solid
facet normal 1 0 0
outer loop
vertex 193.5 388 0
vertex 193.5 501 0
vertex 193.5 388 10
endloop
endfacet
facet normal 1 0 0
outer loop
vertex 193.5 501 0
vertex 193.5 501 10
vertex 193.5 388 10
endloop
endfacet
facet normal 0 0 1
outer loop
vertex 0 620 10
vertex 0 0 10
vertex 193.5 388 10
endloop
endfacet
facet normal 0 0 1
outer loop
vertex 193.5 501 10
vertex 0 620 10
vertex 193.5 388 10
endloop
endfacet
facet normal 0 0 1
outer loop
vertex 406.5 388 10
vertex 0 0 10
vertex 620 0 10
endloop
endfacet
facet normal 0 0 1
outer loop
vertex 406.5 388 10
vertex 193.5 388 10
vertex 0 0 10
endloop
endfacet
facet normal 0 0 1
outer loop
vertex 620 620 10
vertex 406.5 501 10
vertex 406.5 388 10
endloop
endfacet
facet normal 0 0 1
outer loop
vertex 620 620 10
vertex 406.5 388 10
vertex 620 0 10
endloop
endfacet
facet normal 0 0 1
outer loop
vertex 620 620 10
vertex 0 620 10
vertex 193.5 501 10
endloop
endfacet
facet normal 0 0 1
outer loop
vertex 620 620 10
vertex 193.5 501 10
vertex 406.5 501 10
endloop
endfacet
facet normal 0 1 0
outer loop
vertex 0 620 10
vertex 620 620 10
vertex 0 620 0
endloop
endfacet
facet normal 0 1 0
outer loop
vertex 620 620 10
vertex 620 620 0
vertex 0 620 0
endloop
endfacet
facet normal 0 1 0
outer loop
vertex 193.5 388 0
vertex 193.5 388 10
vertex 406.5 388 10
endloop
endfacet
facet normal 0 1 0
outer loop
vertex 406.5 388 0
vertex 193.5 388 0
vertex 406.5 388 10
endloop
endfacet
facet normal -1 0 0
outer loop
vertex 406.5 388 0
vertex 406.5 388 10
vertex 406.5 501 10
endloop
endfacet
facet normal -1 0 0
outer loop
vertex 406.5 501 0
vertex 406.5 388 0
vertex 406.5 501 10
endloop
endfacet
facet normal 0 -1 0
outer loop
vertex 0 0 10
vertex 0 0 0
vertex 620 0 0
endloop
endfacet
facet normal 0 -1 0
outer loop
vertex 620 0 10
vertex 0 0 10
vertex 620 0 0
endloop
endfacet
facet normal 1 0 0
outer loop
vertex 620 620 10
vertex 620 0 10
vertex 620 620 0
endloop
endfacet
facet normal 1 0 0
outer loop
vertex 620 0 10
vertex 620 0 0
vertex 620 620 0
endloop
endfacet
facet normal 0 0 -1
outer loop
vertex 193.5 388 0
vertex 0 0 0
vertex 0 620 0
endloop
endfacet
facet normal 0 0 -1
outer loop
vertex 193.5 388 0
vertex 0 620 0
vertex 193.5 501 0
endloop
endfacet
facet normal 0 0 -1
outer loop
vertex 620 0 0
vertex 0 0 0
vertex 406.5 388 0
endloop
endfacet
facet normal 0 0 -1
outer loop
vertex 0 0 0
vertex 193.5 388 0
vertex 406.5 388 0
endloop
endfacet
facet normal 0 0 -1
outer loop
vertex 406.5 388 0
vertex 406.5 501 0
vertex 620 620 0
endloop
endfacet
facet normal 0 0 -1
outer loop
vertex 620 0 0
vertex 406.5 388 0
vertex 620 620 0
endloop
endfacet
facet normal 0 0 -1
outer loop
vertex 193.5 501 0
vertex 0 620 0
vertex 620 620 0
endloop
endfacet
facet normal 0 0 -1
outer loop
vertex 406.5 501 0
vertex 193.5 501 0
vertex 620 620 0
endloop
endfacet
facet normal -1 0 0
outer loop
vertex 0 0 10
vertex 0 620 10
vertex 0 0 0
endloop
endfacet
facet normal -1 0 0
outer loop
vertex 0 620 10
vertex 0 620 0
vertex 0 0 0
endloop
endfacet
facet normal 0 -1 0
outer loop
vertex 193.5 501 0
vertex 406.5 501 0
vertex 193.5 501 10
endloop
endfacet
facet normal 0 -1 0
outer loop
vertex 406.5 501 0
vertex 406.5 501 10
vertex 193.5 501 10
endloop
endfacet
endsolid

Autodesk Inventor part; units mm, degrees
ref_plane "YZ Plane" through (0, 0, 0) normal (1, 0, 0) x (0, 1, 0)
ref_plane "XZ Plane" through (0, 0, 0) normal (0, 1, 0) x (-1, 0, 0)
ref_plane "XY Plane" through (0, 0, 0) normal (0, 0, 1) x (1, 0, 0)
sketch "Sketch1" plane through (0, 0, 0) normal (0, 0, 1) x (1, 0, 0)
  line L0 (0, 0) -> (620, 0)
  line L1 (620, 0) -> (620, 620)
  line L2 (620, 620) -> (0, 620)
  line L3 (0, 620) -> (0, 0)
  dimension "d0" = 620
  dimension "d1" = 620
extrude "Extrusion1" add sketch "Sketch1" along normal blind 10
sketch "Sketch2" plane through (0, 0, 10) normal (0, 0, 1) x (1, 0, 0)
  line L0 (193.5, 388) -> (406.5, 388)
  line L1 (406.5, 388) -> (406.5, 501)
  line L2 (406.5, 501) -> (193.5, 501)
  line L3 (193.5, 501) -> (193.5, 388)
  line L4 (0, 620) -> (0, 0) projected
  line L5 (620, 620) -> (0, 620) projected
  dimension "d4" = 213
  dimension "d5" = 113
  dimension "d6" = 193.5
  dimension "d7" = 119
extrude "Extrusion2" cut sketch "Sketch2" against normal through all
properties part number "Top Cover" material "ABS Plastic"
